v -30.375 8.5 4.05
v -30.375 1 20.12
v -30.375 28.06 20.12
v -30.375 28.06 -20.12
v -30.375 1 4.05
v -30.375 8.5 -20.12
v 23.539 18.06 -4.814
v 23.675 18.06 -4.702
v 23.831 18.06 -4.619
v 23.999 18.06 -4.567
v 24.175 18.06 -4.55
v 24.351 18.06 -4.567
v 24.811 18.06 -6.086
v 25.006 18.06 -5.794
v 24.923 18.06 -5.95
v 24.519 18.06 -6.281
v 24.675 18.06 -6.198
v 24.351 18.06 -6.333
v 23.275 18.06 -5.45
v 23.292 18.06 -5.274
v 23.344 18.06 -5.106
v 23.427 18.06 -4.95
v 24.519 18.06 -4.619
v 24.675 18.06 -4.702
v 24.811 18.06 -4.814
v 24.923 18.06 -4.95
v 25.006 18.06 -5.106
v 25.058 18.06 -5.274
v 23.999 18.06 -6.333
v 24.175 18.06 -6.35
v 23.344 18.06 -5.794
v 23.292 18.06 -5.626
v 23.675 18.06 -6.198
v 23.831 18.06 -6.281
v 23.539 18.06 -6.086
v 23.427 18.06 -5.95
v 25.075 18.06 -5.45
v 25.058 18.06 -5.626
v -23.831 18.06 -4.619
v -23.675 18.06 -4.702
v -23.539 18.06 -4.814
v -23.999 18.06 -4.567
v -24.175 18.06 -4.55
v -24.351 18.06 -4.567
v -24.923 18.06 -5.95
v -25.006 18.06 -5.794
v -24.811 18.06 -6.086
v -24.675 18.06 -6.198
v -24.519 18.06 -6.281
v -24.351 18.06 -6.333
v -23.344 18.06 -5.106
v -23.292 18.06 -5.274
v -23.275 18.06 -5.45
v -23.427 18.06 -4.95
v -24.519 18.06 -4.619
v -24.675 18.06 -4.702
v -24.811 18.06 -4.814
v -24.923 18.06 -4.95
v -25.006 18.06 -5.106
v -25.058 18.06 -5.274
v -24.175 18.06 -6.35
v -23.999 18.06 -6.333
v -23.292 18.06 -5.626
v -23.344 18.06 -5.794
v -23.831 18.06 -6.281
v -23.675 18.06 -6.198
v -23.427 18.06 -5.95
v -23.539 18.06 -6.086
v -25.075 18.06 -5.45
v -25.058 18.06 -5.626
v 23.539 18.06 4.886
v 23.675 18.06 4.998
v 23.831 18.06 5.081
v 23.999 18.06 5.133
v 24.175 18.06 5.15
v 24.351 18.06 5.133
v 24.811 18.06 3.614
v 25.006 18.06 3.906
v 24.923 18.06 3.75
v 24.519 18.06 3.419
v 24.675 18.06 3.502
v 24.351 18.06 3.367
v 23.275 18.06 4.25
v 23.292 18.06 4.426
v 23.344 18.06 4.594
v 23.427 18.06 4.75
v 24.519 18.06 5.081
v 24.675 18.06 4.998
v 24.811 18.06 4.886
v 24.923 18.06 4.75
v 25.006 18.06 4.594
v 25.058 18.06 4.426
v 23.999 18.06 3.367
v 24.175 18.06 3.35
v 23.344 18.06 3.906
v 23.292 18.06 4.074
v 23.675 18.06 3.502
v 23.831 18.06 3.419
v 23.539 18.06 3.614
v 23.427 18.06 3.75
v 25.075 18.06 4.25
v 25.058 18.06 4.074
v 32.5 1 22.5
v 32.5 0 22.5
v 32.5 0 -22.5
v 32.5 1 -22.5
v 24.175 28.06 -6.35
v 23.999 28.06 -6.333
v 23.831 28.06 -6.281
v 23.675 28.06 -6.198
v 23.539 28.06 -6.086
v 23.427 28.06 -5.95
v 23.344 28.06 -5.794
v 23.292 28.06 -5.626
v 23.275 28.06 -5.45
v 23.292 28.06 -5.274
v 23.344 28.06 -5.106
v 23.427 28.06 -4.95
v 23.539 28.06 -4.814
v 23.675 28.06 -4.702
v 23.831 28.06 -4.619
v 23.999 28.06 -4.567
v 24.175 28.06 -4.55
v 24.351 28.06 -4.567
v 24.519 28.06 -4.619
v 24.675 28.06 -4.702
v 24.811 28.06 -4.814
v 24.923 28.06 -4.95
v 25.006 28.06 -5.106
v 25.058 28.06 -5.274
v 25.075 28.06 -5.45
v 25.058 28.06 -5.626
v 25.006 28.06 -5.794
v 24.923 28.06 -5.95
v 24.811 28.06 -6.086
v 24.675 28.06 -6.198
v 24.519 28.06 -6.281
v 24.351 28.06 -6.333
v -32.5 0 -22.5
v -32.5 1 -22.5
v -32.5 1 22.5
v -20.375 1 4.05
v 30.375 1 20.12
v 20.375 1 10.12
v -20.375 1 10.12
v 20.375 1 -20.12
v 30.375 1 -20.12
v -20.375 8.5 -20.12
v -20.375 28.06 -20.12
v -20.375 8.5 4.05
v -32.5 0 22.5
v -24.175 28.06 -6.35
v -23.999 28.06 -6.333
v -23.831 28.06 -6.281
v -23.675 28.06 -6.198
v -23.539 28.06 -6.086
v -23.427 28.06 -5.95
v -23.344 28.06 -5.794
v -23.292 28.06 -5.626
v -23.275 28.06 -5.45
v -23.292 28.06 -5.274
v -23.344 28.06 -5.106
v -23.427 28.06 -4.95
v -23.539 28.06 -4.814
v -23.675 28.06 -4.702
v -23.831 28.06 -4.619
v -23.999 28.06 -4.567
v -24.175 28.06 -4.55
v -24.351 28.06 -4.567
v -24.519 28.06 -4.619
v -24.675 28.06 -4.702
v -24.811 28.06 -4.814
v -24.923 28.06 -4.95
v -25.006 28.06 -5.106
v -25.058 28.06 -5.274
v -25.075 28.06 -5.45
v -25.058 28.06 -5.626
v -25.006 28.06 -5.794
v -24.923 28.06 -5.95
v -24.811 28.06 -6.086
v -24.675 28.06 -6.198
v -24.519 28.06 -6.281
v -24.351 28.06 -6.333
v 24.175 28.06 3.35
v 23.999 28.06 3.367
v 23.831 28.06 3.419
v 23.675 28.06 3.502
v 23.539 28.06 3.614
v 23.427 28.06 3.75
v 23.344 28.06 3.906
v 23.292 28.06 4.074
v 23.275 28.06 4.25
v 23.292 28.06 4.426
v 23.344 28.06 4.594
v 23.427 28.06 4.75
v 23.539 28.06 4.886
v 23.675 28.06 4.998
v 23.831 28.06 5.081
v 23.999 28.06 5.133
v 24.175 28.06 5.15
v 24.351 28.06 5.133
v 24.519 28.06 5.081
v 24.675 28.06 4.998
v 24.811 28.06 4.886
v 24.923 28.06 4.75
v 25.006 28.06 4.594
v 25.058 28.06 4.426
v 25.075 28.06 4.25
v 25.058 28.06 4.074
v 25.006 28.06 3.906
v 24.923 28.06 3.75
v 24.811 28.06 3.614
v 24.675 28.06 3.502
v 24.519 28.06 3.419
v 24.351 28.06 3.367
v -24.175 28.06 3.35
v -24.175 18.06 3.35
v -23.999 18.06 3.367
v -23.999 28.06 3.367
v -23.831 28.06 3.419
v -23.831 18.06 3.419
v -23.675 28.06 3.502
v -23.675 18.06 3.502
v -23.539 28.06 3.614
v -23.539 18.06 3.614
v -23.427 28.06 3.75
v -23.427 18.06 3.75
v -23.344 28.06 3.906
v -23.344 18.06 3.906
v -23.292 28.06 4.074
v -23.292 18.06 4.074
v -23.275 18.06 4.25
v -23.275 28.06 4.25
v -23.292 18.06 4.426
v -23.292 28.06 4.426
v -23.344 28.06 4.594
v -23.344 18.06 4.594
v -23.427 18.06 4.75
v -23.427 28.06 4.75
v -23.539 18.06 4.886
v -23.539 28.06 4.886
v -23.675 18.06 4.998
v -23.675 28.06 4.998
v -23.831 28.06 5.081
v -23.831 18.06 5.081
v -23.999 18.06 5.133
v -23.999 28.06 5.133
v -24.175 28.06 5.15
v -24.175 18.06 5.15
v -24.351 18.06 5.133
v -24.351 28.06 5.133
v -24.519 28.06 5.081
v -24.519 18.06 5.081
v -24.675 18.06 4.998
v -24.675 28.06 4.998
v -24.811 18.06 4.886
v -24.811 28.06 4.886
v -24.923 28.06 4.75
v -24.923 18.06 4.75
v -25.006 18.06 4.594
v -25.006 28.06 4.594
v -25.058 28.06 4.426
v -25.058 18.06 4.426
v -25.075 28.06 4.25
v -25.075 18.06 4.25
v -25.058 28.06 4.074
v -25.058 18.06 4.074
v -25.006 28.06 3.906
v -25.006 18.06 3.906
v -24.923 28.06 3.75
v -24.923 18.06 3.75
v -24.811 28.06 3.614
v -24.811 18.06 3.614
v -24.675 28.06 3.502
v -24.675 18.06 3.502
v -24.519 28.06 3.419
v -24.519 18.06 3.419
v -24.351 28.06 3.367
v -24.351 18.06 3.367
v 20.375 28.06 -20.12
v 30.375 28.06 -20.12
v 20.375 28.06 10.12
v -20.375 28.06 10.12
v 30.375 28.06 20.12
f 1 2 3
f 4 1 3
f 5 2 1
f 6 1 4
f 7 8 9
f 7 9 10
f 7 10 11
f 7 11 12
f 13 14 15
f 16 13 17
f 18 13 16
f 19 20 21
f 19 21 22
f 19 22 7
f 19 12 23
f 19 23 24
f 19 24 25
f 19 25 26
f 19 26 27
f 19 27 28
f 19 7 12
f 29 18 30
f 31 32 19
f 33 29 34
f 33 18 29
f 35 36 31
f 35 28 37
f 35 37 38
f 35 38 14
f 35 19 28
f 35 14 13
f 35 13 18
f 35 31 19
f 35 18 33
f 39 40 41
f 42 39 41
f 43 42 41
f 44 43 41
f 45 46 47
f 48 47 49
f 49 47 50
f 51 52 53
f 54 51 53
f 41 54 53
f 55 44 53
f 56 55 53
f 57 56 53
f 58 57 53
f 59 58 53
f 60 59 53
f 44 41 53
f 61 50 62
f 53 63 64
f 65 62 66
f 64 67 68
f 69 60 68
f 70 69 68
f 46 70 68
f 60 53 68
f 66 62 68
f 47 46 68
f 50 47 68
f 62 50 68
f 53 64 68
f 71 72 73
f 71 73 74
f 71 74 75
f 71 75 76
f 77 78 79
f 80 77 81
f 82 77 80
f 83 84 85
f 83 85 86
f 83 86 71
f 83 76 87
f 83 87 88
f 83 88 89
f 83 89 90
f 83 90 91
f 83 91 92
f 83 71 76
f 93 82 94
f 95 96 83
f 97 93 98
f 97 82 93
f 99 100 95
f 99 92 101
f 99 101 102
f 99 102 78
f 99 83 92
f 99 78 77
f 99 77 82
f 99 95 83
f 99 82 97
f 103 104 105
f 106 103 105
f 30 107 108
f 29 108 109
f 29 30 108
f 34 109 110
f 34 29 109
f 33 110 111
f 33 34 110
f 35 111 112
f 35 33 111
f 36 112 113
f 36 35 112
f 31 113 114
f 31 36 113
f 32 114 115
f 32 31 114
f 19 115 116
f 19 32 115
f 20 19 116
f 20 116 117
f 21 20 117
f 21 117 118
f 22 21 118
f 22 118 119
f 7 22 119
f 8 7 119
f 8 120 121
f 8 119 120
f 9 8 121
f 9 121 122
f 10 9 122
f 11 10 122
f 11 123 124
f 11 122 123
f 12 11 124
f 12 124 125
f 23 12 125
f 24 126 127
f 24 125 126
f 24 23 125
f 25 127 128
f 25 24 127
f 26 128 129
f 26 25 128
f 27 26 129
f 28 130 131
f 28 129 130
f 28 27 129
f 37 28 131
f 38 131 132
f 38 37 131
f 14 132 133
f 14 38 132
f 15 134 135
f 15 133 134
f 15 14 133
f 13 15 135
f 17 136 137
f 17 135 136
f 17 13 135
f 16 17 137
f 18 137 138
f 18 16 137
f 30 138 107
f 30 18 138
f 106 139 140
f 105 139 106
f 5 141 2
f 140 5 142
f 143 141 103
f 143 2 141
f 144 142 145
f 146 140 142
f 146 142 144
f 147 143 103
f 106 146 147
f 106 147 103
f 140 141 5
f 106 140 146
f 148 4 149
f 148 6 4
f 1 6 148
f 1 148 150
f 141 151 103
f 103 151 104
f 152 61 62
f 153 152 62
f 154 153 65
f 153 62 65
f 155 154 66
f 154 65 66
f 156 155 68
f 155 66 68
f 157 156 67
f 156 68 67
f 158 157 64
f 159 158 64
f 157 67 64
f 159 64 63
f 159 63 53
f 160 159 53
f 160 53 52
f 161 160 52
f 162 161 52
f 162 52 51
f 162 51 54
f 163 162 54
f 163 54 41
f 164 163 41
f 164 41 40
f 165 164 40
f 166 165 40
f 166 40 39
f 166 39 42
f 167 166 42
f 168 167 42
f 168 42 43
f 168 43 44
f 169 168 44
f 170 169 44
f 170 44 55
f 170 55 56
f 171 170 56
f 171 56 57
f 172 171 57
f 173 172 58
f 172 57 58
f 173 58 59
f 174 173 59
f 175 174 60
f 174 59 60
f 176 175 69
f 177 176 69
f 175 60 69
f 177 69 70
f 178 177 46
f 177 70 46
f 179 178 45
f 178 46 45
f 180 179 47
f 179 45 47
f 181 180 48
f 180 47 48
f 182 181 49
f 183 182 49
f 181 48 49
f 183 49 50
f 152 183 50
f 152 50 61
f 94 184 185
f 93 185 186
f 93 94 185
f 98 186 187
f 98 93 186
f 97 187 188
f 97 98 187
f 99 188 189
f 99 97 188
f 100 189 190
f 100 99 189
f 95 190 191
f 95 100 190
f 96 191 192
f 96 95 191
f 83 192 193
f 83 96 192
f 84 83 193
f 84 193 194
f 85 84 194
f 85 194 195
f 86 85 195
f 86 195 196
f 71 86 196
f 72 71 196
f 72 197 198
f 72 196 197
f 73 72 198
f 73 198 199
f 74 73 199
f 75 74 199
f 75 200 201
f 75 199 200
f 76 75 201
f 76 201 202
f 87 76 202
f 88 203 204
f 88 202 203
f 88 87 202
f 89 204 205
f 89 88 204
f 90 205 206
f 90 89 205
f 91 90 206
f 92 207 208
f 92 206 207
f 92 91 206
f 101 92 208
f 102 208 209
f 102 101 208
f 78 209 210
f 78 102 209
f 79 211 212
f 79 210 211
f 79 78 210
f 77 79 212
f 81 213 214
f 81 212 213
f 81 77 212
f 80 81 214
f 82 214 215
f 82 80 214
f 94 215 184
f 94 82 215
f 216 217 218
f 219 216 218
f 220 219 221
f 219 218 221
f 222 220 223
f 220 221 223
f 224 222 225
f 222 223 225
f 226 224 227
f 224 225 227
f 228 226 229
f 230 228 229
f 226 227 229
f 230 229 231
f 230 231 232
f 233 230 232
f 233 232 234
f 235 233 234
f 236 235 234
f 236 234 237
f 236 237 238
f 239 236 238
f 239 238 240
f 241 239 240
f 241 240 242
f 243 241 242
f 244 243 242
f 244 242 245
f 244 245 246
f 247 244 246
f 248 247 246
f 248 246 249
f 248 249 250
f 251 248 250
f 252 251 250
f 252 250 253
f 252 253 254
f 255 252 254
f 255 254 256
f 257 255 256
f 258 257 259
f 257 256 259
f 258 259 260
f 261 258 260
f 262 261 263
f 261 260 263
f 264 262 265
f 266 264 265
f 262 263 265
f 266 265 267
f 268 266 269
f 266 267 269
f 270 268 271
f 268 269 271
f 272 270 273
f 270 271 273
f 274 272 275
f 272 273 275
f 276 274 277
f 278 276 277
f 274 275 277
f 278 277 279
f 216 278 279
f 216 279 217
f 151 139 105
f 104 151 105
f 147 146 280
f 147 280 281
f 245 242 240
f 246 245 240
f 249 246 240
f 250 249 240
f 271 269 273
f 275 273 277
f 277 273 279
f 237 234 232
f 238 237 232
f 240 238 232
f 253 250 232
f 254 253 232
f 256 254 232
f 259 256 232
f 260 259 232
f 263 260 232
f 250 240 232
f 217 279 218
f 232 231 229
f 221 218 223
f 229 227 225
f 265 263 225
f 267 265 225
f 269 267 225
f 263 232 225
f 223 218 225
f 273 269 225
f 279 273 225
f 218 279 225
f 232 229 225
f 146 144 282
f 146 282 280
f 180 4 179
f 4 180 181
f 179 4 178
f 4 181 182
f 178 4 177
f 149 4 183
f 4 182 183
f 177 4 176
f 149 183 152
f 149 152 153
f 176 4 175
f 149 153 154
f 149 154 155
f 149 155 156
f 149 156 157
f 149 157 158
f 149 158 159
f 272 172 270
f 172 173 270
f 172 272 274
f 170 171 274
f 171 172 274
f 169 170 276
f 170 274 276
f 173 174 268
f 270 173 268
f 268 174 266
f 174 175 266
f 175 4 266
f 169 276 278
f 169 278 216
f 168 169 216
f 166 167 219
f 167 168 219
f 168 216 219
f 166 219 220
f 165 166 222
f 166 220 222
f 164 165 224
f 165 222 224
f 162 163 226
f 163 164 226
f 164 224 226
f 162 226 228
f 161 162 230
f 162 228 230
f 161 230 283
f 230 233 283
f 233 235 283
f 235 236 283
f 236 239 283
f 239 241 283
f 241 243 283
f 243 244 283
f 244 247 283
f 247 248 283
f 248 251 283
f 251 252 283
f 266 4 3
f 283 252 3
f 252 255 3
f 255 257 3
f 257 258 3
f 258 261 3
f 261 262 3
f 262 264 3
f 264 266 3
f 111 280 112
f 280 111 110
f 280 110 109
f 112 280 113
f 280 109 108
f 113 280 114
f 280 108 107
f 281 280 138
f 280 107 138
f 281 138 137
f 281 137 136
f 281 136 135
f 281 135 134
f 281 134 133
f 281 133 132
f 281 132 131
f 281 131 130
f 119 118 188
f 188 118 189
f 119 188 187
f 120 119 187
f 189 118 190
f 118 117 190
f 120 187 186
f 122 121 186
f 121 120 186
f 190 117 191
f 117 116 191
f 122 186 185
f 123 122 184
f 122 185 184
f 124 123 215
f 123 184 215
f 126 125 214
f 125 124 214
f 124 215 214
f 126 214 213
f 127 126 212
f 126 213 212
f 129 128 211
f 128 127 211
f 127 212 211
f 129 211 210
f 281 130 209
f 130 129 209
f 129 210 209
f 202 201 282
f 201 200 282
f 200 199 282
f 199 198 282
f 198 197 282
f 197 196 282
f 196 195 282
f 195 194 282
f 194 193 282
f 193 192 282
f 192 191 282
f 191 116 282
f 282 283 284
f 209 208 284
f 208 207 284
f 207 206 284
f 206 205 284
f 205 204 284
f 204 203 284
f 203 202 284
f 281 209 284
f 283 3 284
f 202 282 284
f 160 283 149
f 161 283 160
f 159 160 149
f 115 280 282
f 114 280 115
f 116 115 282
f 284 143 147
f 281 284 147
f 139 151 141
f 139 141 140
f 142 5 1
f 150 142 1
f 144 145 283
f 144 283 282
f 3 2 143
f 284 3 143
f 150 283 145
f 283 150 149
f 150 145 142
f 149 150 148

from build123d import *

# Parameters (mm, degrees)
SKETCH1_W           = 65
SKETCH1_H           = 45
BOSS_EXTRUDE1_DEPTH = 1
SKETCH2_W           = 10
SKETCH2_H           = 40.24
BOSS_EXTRUDE2_DEPTH = 27.06
CUT_EXTRUDE1_START  = -10
SKETCH3_R           = 0.9
CUT_EXTRUDE1_DEPTH  = 59.475391695
CUT_EXTRUDE2_REACH  = 74.435
SKETCH4_W           = 8.1
SKETCH4_H           = 7.5
SKETCH5_W           = 40.75
SKETCH5_H           = 10
BOSS_EXTRUDE3_DEPTH = 27.06
SKETCH6_W           = 16.07
SKETCH6_H           = 7.5
CUT_EXTRUDE3_DEPTH  = 50.75
SKETCH7_W           = 40.75
SKETCH7_H           = 10
CUT_EXTRUDE4_DEPTH  = 27.06


with BuildPart() as part:
    # Sketch1 → Boss-Extrude1 (new body)
    with BuildSketch(Plane(origin=(0, 0, 0), x_dir=(1, 0, 0), z_dir=(0, 1, 0))):
        Rectangle(SKETCH1_W, SKETCH1_H)
    extrude(amount=BOSS_EXTRUDE1_DEPTH)

    # Sketch2 → Boss-Extrude2 (add)
    with BuildSketch(Plane(origin=(0, 1, 0), x_dir=(1, 0, 0), z_dir=(0, 1, 0))):
        with Locations((25.375, 0)):
            Rectangle(SKETCH2_W, SKETCH2_H)
    boss_extrude2 = extrude(amount=BOSS_EXTRUDE2_DEPTH)

    # Sketch3 → Cut-Extrude1 (cut)
    with BuildSketch(Plane(origin=(0, 28.06, 0), x_dir=(1, 0, 0), z_dir=(0, 1, 0)).offset(CUT_EXTRUDE1_START)):
        with Locations(Location((24.175, 5.45, 0), (0, 0, 90))):
            Circle(SKETCH3_R)
        with Locations(Location((24.175, -4.25, 0), (0, 0, 90))):
            Circle(SKETCH3_R)
    cut_extrude1 = extrude(amount=CUT_EXTRUDE1_DEPTH, mode=Mode.SUBTRACT)

    # Mirror3: Boss-Extrude2, Cut-Extrude1 across plane
    add(boss_extrude2.mirror(Plane(origin=(0, 0, 0), x_dir=(0, 0, 1), z_dir=(1, 0, 0))))
    add(cut_extrude1.mirror(Plane(origin=(0, 0, 0), x_dir=(0, 0, 1), z_dir=(1, 0, 0))), mode=Mode.SUBTRACT)

    # Sketch4 → Cut-Extrude2 (cut, up to next)
    with BuildSketch(Plane.ZY.offset(30.375), mode=Mode.PRIVATE) as cut_extrude2_sk1:
        with Locations((0, 4.75)):
            Rectangle(SKETCH4_W, SKETCH4_H)
    cut_extrude2_tool1 = extrude(cut_extrude2_sk1.sketch, amount=-CUT_EXTRUDE2_REACH, mode=Mode.PRIVATE) & part.part
    add(cut_extrude2_tool1.solids().sort_by_distance((-30.375, 4.75, 0))[0], mode=Mode.SUBTRACT)

    # Sketch5 → Boss-Extrude3 (add)
    with BuildSketch(Plane(origin=(0, 1, 0), x_dir=(1, 0, 0), z_dir=(0, 1, 0))):
        with Locations((0, 15.12)):
            Rectangle(SKETCH5_W, SKETCH5_H)
    boss_extrude3 = extrude(amount=BOSS_EXTRUDE3_DEPTH)

    # Mirror4: Boss-Extrude3 across plane
    add(boss_extrude3.mirror(Plane.XY))

    # Sketch6 → Cut-Extrude3 (cut)
    with BuildSketch(Plane.ZY.offset(30.375)):
        with Locations((-12.085, 4.75)):
            Rectangle(SKETCH6_W, SKETCH6_H)
    extrude(amount=-CUT_EXTRUDE3_DEPTH, mode=Mode.SUBTRACT)

    # Sketch7 → Cut-Extrude4 (cut)
    with BuildSketch(Plane(origin=(0, 28.06, 0), x_dir=(1, 0, 0), z_dir=(0, 1, 0))):
        with Locations((0, 15.12)):
            Rectangle(SKETCH7_W, SKETCH7_H)
    extrude(amount=-CUT_EXTRUDE4_DEPTH, mode=Mode.SUBTRACT)


solid = part.part
